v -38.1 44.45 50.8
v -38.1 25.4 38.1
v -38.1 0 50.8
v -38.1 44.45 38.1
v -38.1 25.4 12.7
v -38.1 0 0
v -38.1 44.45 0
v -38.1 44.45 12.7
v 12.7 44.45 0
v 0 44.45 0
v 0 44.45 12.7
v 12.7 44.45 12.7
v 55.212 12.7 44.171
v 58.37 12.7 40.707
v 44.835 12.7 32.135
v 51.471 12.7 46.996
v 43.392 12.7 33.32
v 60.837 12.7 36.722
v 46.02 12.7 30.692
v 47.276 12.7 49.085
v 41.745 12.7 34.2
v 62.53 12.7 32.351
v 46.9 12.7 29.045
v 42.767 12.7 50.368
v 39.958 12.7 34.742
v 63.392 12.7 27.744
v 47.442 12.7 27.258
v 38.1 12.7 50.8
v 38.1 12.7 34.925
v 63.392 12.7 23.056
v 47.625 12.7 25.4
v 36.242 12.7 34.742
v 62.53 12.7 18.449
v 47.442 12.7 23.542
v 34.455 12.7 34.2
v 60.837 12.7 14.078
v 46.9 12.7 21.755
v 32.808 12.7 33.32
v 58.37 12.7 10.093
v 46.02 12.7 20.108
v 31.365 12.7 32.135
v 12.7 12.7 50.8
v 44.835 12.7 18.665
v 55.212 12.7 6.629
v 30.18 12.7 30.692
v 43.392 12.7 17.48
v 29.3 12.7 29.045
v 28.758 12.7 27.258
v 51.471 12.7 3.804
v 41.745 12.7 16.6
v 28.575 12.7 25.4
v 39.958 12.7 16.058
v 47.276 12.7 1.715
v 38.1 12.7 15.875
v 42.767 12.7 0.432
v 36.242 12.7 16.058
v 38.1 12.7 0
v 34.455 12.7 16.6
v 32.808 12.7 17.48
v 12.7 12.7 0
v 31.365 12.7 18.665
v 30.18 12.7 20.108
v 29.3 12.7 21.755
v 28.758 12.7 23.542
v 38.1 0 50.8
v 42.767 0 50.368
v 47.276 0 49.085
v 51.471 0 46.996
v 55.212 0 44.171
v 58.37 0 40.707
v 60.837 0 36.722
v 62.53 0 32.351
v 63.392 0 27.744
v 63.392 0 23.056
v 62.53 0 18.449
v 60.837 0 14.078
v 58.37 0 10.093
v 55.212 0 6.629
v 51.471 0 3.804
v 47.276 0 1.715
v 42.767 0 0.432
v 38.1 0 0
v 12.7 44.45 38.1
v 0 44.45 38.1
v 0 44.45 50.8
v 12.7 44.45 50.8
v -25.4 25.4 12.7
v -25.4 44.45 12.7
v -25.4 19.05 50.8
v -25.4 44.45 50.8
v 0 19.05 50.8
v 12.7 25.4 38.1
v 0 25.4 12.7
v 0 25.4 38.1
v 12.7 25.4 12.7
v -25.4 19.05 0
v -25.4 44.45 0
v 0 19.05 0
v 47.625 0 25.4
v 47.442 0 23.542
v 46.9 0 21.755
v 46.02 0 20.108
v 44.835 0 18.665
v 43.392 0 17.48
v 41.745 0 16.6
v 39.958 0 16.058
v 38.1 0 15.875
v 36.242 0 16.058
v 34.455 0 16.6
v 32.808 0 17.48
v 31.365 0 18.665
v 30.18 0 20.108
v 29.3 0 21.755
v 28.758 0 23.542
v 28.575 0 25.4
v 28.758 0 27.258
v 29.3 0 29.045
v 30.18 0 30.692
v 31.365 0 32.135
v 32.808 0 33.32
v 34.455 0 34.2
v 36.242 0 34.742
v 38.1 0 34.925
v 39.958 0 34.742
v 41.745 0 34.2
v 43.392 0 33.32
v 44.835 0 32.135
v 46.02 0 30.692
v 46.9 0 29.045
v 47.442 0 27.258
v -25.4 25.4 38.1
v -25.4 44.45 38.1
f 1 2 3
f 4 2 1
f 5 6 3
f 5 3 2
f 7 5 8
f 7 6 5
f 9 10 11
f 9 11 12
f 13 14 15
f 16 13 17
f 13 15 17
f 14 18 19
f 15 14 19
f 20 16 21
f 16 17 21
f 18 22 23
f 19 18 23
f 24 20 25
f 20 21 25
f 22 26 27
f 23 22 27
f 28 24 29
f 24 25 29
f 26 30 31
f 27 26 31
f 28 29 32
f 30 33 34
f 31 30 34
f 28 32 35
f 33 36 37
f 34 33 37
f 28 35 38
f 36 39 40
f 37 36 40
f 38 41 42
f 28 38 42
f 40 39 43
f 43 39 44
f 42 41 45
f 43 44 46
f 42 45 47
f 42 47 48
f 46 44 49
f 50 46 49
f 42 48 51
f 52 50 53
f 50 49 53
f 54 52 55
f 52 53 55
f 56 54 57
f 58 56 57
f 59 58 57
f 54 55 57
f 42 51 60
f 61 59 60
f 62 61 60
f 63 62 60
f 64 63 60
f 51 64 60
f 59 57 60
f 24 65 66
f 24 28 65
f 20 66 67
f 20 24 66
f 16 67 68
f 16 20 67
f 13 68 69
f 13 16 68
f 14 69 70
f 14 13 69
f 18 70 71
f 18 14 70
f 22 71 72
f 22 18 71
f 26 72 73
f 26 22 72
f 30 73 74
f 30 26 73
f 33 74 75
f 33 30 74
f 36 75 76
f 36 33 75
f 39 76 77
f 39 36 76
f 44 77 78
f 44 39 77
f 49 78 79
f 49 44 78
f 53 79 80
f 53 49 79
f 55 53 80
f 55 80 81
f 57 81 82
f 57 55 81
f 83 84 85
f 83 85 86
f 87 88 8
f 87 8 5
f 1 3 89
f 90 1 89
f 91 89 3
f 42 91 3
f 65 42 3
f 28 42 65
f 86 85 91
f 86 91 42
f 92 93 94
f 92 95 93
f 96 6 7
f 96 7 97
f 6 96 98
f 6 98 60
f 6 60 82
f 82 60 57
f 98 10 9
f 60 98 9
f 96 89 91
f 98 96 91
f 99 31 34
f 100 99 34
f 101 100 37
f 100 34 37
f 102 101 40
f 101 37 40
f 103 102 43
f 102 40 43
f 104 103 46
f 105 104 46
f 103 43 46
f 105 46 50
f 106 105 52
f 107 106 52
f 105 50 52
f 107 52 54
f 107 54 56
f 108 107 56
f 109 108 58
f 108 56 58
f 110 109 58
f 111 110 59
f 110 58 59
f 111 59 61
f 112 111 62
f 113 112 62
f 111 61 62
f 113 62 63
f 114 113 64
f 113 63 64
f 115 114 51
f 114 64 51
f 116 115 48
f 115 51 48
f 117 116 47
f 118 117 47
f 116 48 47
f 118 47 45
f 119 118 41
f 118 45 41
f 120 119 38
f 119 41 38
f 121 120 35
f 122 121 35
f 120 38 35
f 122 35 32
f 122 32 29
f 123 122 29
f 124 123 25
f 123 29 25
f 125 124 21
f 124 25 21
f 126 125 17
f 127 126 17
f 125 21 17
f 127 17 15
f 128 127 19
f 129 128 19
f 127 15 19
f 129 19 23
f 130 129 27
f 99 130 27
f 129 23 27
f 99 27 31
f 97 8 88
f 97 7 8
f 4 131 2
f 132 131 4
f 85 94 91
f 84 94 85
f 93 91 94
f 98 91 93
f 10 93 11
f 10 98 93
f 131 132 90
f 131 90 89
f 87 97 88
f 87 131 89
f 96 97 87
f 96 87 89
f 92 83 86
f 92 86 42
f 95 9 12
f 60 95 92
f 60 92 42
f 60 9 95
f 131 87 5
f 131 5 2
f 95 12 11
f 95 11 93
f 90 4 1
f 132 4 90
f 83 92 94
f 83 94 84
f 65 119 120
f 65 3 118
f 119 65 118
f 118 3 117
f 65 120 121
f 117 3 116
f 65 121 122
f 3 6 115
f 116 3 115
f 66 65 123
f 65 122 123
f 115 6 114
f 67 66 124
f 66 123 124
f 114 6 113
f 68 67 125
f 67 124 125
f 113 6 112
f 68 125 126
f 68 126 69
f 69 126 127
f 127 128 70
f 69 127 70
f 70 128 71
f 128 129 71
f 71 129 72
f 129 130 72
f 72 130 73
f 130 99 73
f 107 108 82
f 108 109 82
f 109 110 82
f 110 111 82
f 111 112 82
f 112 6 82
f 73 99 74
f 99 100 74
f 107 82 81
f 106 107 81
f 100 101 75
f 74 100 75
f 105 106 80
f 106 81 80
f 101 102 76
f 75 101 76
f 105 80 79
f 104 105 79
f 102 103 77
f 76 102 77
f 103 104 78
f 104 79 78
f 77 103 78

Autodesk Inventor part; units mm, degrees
ref_plane "YZ Plane" through (0, 0, 0) normal (1, 0, 0) x (0, 1, 0)
ref_plane "XZ Plane" through (0, 0, 0) normal (0, 1, 0) x (-1, 0, 0)
ref_plane "XY Plane" through (0, 0, 0) normal (0, 0, 1) x (1, 0, 0)
sketch "SIDE PROFILE" plane through (0, 0, 0) normal (0, 0, 1) x (1, 0, 0)
  line L0 (-38.1, 0) -> (38.1, 0)
  line L1 (-38.1, 0) -> (-38.1, 44.45)
  line L2 (-38.1, 44.45) -> (-25.4, 44.45)
  line L3 (-25.4, 44.45) -> (-25.4, 19.05)
  line L4 (-25.4, 19.05) -> (0, 19.05)
  line L5 (0, 19.05) -> (0, 44.45)
  line L6 (0, 44.45) -> (12.7, 44.45)
  line L7 (12.7, 44.45) -> (12.7, 12.7)
  line L8 (38.1, 0) -> (38.1, 12.7)
  line L9 (38.1, 12.7) -> (12.7, 12.7)
  point P0 (0, 0)
  dimension "d0" = 76.2
  dimension "d1" = 38.1
  dimension "d2" = 44.45
  dimension "d3" = 12.7
  dimension "d4" = 25.4
  dimension "d5" = 25.4
  dimension "d6" = 25.4
  dimension "d7" = 12.7
  dimension "d8" = 31.75
  dimension "d21" = 25.4
  dimension "d22" = 38.1
extrude "SIDE PROFILE EXTRUSION" add sketch "SIDE PROFILE" along normal blind 50.8
sketch "SEMICIRCLE" plane through (12.7, 12.7, 0) normal (0, 1, 0) x (1, 0, 0)
  line L0 (25.4, 0) -> (25.4, -50.8) projected
  line L1 (25.4, -50.8) -> (0, -50.8) projected
  circle A0 centre (25.4, -25.4) radius 25.4
  point P0 (-12.7, 0)
extrude "FRONT ROUNDING" add sketch "SEMICIRCLE" against normal blind 12.7
sketch "CIRCLE" plane through (12.7, 12.7, 50.8) normal (0, 1, 0) x (1, 0, 0)
  arc A0 (25.4, 0) -> (25.4, 50.8) centre (25.4, 25.4) ccw projected
  circle A1 centre (25.4, 25.4) radius 9.525
  point P0 (-12.7, 50.8)
  dimension "d13" = 19.05
extrude "HOLE CUTOUT" cut sketch "CIRCLE" against normal blind 12.7
sketch "RECTANGLE" plane through (12.7, 12.7, 0) normal (1, 0, 0) x (0, 0, -1)
  line L0 (0, 31.75) -> (-50.8, 31.75) projected
  line L1 (-38.1, 31.75) -> (-12.7, 31.75)
  line L2 (-12.7, 31.75) -> (-12.7, 12.7)
  line L3 (-12.7, 12.7) -> (-38.1, 12.7)
  line L4 (-38.1, 12.7) -> (-38.1, 31.75)
  line L5 (0, 0) -> (0, 31.75) projected
  point P0 (0, -12.7)
  point P1 (-25.4, 31.75)
  dimension "d16" = 25.4
  dimension "d17" = 19.05
  dimension "d18" = 12.7
extrude "RECTANGULAR CUTOUT" cut sketch "RECTANGLE" against normal through all
properties part number "ASN4-TUT-BK" material "Copper, Cast"
